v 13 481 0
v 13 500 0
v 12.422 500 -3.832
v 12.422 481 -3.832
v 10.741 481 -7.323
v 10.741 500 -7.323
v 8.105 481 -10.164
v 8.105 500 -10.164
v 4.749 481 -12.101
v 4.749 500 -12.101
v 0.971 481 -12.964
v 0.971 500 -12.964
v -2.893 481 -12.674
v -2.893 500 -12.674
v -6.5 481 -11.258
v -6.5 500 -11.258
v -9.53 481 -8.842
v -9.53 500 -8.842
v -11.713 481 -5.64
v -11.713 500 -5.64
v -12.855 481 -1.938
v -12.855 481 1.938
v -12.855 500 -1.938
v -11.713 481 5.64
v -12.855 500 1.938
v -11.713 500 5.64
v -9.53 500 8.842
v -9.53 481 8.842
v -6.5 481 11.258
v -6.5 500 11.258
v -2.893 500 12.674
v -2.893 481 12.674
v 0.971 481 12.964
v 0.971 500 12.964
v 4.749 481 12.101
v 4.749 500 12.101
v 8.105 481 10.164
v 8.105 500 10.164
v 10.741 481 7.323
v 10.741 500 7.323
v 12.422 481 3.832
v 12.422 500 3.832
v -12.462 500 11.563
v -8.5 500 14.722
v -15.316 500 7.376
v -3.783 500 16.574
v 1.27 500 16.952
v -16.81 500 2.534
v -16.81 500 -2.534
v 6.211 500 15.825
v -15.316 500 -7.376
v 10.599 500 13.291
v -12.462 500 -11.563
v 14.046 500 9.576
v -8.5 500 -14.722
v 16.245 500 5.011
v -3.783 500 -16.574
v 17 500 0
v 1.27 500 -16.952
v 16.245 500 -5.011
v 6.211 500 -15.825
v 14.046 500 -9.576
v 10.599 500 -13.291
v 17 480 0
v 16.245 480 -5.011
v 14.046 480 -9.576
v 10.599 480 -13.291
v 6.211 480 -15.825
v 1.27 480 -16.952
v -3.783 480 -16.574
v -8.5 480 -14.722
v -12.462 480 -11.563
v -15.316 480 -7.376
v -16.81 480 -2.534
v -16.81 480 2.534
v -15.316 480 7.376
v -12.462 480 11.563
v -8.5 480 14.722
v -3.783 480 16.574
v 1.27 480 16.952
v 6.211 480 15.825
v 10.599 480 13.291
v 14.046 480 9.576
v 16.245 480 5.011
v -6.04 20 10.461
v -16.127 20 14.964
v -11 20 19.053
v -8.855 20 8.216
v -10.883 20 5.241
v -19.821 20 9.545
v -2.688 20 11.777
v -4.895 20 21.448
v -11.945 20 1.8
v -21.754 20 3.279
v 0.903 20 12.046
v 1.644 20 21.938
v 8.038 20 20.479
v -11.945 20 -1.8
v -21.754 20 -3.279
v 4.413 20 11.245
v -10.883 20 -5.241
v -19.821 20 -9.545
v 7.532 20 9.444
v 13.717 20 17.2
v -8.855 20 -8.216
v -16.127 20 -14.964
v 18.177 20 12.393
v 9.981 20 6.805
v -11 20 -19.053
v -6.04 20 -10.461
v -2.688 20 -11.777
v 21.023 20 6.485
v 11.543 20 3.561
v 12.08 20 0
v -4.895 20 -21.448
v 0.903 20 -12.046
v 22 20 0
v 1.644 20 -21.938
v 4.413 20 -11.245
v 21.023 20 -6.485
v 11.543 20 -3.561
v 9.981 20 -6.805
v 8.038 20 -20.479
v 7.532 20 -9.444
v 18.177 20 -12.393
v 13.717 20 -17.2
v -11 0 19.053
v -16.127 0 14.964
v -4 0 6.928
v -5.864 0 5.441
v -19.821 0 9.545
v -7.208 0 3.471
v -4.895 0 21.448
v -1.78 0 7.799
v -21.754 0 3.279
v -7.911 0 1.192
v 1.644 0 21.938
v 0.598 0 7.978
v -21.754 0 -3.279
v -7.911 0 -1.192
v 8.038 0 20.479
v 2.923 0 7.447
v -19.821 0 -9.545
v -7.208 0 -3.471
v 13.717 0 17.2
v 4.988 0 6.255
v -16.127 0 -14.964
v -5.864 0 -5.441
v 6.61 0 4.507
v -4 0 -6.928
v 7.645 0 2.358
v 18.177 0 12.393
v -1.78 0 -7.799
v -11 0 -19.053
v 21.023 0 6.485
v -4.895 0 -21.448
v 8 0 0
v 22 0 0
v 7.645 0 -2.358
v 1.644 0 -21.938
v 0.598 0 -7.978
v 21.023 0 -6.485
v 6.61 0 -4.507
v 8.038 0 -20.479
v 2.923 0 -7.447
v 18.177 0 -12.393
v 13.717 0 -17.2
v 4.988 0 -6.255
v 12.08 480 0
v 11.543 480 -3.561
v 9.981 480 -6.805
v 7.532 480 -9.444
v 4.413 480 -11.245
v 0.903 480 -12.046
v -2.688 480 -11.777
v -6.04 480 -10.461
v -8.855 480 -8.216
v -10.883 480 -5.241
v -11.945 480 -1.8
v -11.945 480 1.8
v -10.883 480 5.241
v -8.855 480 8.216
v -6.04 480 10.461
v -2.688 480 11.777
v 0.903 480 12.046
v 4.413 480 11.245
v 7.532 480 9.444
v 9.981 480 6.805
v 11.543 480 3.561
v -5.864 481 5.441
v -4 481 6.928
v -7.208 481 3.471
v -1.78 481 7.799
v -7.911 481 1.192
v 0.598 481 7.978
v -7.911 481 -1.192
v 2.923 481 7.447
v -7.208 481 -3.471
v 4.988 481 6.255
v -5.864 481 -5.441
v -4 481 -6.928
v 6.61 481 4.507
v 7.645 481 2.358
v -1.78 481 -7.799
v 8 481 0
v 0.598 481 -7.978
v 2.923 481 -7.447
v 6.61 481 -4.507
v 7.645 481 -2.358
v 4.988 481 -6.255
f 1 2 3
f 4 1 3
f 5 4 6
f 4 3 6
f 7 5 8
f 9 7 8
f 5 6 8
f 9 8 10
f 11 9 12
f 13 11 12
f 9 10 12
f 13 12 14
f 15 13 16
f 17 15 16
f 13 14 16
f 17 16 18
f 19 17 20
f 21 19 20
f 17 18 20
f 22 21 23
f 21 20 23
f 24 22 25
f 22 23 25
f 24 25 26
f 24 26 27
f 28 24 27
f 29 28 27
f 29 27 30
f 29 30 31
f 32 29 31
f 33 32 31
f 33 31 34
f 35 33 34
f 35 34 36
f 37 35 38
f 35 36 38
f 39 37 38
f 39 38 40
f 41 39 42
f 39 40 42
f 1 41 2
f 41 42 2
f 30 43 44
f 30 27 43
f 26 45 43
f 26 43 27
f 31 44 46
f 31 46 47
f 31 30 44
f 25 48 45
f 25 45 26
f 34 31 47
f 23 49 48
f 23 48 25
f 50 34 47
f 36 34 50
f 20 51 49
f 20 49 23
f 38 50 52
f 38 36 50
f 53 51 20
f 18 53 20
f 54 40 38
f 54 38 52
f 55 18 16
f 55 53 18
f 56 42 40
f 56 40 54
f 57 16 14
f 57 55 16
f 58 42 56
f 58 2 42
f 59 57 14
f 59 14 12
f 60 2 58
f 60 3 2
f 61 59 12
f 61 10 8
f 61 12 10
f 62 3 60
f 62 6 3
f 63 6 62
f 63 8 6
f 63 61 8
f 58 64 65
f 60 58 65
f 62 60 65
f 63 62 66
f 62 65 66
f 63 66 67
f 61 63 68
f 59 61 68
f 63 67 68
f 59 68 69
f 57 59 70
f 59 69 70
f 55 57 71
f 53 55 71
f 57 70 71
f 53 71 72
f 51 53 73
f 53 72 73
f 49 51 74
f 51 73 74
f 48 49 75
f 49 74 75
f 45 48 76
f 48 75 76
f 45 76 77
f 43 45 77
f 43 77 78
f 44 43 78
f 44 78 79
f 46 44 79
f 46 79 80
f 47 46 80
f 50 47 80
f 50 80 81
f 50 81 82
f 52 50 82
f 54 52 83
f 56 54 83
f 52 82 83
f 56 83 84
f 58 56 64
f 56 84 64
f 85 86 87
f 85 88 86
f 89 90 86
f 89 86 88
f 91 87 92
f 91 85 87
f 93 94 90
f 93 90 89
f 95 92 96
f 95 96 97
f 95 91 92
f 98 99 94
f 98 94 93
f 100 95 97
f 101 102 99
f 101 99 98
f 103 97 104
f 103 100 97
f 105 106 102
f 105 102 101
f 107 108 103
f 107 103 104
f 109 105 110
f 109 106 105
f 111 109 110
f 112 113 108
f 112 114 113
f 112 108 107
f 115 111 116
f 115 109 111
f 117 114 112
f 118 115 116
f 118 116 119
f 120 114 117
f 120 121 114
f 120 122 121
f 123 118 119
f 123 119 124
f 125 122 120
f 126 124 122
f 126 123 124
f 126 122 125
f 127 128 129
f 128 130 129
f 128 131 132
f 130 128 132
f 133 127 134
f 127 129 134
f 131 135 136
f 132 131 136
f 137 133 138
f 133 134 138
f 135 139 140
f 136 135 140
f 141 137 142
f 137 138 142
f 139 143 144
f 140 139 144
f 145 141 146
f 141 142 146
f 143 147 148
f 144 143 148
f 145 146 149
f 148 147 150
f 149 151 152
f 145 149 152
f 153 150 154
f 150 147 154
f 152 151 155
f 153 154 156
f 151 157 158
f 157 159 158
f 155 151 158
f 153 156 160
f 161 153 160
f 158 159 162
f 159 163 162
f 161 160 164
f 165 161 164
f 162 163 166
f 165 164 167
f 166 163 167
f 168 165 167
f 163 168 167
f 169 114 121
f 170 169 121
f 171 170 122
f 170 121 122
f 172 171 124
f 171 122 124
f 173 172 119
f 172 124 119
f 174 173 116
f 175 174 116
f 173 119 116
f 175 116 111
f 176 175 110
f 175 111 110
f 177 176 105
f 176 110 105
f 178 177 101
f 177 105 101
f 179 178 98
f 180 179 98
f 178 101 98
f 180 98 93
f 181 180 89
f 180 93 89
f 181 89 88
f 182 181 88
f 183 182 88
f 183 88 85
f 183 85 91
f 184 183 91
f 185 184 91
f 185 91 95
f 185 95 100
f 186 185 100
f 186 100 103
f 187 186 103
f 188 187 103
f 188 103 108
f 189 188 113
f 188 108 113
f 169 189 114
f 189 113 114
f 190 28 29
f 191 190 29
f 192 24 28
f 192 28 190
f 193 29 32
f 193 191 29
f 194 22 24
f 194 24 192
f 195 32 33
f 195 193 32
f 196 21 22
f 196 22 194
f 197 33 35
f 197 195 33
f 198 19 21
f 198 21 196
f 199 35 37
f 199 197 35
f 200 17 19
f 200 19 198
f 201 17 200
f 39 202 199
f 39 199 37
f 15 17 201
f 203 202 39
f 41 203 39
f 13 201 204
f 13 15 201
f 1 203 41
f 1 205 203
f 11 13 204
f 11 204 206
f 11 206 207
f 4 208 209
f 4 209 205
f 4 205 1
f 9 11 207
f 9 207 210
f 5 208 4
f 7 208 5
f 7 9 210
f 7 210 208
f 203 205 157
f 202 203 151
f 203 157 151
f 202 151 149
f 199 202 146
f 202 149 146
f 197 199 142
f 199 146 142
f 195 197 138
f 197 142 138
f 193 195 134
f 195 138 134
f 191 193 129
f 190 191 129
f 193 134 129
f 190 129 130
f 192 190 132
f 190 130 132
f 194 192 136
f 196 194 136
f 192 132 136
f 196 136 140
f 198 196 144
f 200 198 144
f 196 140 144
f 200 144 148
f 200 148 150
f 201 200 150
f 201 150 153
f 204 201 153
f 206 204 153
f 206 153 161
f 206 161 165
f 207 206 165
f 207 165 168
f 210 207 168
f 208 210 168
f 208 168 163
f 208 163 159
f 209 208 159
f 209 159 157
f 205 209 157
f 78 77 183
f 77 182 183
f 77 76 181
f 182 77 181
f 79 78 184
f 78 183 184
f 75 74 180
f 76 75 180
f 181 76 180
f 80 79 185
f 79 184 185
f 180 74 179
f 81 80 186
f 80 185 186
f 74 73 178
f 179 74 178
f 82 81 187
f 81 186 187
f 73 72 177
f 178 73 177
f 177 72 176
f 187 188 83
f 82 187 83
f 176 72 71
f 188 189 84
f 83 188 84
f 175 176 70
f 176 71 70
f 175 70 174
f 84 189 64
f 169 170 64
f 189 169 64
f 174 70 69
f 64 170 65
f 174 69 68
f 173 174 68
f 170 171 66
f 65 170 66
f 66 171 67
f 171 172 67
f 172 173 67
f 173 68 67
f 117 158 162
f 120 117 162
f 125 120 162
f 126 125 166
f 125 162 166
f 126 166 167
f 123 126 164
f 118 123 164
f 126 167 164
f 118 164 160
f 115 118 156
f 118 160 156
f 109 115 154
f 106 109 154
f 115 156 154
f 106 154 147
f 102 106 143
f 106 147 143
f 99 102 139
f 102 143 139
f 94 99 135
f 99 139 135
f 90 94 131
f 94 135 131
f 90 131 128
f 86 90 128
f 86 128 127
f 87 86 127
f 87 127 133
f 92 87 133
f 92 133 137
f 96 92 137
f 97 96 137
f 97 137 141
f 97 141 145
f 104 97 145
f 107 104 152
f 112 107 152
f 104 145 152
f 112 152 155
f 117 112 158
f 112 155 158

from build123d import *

# Parameters (mm, degrees)
SKETCH_1_R          = 22
EXTRUDE_1_DEPTH     = 20
SKETCH_2_R          = 12.079771489
EXTRUDE_2_DEPTH     = 460
SKETCH_3_R          = 17
EXTRUDE_3_DEPTH     = 20
SKETCH_4_R          = 8
CUT_EXTRUDE_1_DEPTH = 501
SKETCH_5_R          = 13
CUT_EXTRUDE_2_DEPTH = 19


with BuildPart() as part:
    # 草图1 → 凸台-拉伸1 (new body)
    with BuildSketch(Plane(origin=(0, 0, 0), x_dir=(1, 0, 0), z_dir=(0, 1, 0))):
        Circle(SKETCH_1_R)
    extrude(amount=EXTRUDE_1_DEPTH)

    # 草图2 → 凸台-拉伸2 (add)
    with BuildSketch(Plane(origin=(0, 20, 0), x_dir=(1, 0, 0), z_dir=(0, 1, 0))):
        Circle(SKETCH_2_R)
    extrude(amount=EXTRUDE_2_DEPTH)

    # 草图3 → 凸台-拉伸3 (add)
    with BuildSketch(Plane(origin=(0, 480, 0), x_dir=(1, 0, 0), z_dir=(0, 1, 0))):
        Circle(SKETCH_3_R)
    extrude(amount=EXTRUDE_3_DEPTH)

    # 草图4 → 切除-拉伸1 (cut, through all)
    with BuildSketch(Plane.XZ):
        Circle(SKETCH_4_R)
    extrude(amount=-CUT_EXTRUDE_1_DEPTH, mode=Mode.SUBTRACT)

    # 草图5 → 切除-拉伸2 (cut)
    with BuildSketch(Plane(origin=(0, 500, 0), x_dir=(1, 0, 0), z_dir=(0, 1, 0))):
        Circle(SKETCH_5_R)
    extrude(amount=-CUT_EXTRUDE_2_DEPTH, mode=Mode.SUBTRACT)


solid = part.part
